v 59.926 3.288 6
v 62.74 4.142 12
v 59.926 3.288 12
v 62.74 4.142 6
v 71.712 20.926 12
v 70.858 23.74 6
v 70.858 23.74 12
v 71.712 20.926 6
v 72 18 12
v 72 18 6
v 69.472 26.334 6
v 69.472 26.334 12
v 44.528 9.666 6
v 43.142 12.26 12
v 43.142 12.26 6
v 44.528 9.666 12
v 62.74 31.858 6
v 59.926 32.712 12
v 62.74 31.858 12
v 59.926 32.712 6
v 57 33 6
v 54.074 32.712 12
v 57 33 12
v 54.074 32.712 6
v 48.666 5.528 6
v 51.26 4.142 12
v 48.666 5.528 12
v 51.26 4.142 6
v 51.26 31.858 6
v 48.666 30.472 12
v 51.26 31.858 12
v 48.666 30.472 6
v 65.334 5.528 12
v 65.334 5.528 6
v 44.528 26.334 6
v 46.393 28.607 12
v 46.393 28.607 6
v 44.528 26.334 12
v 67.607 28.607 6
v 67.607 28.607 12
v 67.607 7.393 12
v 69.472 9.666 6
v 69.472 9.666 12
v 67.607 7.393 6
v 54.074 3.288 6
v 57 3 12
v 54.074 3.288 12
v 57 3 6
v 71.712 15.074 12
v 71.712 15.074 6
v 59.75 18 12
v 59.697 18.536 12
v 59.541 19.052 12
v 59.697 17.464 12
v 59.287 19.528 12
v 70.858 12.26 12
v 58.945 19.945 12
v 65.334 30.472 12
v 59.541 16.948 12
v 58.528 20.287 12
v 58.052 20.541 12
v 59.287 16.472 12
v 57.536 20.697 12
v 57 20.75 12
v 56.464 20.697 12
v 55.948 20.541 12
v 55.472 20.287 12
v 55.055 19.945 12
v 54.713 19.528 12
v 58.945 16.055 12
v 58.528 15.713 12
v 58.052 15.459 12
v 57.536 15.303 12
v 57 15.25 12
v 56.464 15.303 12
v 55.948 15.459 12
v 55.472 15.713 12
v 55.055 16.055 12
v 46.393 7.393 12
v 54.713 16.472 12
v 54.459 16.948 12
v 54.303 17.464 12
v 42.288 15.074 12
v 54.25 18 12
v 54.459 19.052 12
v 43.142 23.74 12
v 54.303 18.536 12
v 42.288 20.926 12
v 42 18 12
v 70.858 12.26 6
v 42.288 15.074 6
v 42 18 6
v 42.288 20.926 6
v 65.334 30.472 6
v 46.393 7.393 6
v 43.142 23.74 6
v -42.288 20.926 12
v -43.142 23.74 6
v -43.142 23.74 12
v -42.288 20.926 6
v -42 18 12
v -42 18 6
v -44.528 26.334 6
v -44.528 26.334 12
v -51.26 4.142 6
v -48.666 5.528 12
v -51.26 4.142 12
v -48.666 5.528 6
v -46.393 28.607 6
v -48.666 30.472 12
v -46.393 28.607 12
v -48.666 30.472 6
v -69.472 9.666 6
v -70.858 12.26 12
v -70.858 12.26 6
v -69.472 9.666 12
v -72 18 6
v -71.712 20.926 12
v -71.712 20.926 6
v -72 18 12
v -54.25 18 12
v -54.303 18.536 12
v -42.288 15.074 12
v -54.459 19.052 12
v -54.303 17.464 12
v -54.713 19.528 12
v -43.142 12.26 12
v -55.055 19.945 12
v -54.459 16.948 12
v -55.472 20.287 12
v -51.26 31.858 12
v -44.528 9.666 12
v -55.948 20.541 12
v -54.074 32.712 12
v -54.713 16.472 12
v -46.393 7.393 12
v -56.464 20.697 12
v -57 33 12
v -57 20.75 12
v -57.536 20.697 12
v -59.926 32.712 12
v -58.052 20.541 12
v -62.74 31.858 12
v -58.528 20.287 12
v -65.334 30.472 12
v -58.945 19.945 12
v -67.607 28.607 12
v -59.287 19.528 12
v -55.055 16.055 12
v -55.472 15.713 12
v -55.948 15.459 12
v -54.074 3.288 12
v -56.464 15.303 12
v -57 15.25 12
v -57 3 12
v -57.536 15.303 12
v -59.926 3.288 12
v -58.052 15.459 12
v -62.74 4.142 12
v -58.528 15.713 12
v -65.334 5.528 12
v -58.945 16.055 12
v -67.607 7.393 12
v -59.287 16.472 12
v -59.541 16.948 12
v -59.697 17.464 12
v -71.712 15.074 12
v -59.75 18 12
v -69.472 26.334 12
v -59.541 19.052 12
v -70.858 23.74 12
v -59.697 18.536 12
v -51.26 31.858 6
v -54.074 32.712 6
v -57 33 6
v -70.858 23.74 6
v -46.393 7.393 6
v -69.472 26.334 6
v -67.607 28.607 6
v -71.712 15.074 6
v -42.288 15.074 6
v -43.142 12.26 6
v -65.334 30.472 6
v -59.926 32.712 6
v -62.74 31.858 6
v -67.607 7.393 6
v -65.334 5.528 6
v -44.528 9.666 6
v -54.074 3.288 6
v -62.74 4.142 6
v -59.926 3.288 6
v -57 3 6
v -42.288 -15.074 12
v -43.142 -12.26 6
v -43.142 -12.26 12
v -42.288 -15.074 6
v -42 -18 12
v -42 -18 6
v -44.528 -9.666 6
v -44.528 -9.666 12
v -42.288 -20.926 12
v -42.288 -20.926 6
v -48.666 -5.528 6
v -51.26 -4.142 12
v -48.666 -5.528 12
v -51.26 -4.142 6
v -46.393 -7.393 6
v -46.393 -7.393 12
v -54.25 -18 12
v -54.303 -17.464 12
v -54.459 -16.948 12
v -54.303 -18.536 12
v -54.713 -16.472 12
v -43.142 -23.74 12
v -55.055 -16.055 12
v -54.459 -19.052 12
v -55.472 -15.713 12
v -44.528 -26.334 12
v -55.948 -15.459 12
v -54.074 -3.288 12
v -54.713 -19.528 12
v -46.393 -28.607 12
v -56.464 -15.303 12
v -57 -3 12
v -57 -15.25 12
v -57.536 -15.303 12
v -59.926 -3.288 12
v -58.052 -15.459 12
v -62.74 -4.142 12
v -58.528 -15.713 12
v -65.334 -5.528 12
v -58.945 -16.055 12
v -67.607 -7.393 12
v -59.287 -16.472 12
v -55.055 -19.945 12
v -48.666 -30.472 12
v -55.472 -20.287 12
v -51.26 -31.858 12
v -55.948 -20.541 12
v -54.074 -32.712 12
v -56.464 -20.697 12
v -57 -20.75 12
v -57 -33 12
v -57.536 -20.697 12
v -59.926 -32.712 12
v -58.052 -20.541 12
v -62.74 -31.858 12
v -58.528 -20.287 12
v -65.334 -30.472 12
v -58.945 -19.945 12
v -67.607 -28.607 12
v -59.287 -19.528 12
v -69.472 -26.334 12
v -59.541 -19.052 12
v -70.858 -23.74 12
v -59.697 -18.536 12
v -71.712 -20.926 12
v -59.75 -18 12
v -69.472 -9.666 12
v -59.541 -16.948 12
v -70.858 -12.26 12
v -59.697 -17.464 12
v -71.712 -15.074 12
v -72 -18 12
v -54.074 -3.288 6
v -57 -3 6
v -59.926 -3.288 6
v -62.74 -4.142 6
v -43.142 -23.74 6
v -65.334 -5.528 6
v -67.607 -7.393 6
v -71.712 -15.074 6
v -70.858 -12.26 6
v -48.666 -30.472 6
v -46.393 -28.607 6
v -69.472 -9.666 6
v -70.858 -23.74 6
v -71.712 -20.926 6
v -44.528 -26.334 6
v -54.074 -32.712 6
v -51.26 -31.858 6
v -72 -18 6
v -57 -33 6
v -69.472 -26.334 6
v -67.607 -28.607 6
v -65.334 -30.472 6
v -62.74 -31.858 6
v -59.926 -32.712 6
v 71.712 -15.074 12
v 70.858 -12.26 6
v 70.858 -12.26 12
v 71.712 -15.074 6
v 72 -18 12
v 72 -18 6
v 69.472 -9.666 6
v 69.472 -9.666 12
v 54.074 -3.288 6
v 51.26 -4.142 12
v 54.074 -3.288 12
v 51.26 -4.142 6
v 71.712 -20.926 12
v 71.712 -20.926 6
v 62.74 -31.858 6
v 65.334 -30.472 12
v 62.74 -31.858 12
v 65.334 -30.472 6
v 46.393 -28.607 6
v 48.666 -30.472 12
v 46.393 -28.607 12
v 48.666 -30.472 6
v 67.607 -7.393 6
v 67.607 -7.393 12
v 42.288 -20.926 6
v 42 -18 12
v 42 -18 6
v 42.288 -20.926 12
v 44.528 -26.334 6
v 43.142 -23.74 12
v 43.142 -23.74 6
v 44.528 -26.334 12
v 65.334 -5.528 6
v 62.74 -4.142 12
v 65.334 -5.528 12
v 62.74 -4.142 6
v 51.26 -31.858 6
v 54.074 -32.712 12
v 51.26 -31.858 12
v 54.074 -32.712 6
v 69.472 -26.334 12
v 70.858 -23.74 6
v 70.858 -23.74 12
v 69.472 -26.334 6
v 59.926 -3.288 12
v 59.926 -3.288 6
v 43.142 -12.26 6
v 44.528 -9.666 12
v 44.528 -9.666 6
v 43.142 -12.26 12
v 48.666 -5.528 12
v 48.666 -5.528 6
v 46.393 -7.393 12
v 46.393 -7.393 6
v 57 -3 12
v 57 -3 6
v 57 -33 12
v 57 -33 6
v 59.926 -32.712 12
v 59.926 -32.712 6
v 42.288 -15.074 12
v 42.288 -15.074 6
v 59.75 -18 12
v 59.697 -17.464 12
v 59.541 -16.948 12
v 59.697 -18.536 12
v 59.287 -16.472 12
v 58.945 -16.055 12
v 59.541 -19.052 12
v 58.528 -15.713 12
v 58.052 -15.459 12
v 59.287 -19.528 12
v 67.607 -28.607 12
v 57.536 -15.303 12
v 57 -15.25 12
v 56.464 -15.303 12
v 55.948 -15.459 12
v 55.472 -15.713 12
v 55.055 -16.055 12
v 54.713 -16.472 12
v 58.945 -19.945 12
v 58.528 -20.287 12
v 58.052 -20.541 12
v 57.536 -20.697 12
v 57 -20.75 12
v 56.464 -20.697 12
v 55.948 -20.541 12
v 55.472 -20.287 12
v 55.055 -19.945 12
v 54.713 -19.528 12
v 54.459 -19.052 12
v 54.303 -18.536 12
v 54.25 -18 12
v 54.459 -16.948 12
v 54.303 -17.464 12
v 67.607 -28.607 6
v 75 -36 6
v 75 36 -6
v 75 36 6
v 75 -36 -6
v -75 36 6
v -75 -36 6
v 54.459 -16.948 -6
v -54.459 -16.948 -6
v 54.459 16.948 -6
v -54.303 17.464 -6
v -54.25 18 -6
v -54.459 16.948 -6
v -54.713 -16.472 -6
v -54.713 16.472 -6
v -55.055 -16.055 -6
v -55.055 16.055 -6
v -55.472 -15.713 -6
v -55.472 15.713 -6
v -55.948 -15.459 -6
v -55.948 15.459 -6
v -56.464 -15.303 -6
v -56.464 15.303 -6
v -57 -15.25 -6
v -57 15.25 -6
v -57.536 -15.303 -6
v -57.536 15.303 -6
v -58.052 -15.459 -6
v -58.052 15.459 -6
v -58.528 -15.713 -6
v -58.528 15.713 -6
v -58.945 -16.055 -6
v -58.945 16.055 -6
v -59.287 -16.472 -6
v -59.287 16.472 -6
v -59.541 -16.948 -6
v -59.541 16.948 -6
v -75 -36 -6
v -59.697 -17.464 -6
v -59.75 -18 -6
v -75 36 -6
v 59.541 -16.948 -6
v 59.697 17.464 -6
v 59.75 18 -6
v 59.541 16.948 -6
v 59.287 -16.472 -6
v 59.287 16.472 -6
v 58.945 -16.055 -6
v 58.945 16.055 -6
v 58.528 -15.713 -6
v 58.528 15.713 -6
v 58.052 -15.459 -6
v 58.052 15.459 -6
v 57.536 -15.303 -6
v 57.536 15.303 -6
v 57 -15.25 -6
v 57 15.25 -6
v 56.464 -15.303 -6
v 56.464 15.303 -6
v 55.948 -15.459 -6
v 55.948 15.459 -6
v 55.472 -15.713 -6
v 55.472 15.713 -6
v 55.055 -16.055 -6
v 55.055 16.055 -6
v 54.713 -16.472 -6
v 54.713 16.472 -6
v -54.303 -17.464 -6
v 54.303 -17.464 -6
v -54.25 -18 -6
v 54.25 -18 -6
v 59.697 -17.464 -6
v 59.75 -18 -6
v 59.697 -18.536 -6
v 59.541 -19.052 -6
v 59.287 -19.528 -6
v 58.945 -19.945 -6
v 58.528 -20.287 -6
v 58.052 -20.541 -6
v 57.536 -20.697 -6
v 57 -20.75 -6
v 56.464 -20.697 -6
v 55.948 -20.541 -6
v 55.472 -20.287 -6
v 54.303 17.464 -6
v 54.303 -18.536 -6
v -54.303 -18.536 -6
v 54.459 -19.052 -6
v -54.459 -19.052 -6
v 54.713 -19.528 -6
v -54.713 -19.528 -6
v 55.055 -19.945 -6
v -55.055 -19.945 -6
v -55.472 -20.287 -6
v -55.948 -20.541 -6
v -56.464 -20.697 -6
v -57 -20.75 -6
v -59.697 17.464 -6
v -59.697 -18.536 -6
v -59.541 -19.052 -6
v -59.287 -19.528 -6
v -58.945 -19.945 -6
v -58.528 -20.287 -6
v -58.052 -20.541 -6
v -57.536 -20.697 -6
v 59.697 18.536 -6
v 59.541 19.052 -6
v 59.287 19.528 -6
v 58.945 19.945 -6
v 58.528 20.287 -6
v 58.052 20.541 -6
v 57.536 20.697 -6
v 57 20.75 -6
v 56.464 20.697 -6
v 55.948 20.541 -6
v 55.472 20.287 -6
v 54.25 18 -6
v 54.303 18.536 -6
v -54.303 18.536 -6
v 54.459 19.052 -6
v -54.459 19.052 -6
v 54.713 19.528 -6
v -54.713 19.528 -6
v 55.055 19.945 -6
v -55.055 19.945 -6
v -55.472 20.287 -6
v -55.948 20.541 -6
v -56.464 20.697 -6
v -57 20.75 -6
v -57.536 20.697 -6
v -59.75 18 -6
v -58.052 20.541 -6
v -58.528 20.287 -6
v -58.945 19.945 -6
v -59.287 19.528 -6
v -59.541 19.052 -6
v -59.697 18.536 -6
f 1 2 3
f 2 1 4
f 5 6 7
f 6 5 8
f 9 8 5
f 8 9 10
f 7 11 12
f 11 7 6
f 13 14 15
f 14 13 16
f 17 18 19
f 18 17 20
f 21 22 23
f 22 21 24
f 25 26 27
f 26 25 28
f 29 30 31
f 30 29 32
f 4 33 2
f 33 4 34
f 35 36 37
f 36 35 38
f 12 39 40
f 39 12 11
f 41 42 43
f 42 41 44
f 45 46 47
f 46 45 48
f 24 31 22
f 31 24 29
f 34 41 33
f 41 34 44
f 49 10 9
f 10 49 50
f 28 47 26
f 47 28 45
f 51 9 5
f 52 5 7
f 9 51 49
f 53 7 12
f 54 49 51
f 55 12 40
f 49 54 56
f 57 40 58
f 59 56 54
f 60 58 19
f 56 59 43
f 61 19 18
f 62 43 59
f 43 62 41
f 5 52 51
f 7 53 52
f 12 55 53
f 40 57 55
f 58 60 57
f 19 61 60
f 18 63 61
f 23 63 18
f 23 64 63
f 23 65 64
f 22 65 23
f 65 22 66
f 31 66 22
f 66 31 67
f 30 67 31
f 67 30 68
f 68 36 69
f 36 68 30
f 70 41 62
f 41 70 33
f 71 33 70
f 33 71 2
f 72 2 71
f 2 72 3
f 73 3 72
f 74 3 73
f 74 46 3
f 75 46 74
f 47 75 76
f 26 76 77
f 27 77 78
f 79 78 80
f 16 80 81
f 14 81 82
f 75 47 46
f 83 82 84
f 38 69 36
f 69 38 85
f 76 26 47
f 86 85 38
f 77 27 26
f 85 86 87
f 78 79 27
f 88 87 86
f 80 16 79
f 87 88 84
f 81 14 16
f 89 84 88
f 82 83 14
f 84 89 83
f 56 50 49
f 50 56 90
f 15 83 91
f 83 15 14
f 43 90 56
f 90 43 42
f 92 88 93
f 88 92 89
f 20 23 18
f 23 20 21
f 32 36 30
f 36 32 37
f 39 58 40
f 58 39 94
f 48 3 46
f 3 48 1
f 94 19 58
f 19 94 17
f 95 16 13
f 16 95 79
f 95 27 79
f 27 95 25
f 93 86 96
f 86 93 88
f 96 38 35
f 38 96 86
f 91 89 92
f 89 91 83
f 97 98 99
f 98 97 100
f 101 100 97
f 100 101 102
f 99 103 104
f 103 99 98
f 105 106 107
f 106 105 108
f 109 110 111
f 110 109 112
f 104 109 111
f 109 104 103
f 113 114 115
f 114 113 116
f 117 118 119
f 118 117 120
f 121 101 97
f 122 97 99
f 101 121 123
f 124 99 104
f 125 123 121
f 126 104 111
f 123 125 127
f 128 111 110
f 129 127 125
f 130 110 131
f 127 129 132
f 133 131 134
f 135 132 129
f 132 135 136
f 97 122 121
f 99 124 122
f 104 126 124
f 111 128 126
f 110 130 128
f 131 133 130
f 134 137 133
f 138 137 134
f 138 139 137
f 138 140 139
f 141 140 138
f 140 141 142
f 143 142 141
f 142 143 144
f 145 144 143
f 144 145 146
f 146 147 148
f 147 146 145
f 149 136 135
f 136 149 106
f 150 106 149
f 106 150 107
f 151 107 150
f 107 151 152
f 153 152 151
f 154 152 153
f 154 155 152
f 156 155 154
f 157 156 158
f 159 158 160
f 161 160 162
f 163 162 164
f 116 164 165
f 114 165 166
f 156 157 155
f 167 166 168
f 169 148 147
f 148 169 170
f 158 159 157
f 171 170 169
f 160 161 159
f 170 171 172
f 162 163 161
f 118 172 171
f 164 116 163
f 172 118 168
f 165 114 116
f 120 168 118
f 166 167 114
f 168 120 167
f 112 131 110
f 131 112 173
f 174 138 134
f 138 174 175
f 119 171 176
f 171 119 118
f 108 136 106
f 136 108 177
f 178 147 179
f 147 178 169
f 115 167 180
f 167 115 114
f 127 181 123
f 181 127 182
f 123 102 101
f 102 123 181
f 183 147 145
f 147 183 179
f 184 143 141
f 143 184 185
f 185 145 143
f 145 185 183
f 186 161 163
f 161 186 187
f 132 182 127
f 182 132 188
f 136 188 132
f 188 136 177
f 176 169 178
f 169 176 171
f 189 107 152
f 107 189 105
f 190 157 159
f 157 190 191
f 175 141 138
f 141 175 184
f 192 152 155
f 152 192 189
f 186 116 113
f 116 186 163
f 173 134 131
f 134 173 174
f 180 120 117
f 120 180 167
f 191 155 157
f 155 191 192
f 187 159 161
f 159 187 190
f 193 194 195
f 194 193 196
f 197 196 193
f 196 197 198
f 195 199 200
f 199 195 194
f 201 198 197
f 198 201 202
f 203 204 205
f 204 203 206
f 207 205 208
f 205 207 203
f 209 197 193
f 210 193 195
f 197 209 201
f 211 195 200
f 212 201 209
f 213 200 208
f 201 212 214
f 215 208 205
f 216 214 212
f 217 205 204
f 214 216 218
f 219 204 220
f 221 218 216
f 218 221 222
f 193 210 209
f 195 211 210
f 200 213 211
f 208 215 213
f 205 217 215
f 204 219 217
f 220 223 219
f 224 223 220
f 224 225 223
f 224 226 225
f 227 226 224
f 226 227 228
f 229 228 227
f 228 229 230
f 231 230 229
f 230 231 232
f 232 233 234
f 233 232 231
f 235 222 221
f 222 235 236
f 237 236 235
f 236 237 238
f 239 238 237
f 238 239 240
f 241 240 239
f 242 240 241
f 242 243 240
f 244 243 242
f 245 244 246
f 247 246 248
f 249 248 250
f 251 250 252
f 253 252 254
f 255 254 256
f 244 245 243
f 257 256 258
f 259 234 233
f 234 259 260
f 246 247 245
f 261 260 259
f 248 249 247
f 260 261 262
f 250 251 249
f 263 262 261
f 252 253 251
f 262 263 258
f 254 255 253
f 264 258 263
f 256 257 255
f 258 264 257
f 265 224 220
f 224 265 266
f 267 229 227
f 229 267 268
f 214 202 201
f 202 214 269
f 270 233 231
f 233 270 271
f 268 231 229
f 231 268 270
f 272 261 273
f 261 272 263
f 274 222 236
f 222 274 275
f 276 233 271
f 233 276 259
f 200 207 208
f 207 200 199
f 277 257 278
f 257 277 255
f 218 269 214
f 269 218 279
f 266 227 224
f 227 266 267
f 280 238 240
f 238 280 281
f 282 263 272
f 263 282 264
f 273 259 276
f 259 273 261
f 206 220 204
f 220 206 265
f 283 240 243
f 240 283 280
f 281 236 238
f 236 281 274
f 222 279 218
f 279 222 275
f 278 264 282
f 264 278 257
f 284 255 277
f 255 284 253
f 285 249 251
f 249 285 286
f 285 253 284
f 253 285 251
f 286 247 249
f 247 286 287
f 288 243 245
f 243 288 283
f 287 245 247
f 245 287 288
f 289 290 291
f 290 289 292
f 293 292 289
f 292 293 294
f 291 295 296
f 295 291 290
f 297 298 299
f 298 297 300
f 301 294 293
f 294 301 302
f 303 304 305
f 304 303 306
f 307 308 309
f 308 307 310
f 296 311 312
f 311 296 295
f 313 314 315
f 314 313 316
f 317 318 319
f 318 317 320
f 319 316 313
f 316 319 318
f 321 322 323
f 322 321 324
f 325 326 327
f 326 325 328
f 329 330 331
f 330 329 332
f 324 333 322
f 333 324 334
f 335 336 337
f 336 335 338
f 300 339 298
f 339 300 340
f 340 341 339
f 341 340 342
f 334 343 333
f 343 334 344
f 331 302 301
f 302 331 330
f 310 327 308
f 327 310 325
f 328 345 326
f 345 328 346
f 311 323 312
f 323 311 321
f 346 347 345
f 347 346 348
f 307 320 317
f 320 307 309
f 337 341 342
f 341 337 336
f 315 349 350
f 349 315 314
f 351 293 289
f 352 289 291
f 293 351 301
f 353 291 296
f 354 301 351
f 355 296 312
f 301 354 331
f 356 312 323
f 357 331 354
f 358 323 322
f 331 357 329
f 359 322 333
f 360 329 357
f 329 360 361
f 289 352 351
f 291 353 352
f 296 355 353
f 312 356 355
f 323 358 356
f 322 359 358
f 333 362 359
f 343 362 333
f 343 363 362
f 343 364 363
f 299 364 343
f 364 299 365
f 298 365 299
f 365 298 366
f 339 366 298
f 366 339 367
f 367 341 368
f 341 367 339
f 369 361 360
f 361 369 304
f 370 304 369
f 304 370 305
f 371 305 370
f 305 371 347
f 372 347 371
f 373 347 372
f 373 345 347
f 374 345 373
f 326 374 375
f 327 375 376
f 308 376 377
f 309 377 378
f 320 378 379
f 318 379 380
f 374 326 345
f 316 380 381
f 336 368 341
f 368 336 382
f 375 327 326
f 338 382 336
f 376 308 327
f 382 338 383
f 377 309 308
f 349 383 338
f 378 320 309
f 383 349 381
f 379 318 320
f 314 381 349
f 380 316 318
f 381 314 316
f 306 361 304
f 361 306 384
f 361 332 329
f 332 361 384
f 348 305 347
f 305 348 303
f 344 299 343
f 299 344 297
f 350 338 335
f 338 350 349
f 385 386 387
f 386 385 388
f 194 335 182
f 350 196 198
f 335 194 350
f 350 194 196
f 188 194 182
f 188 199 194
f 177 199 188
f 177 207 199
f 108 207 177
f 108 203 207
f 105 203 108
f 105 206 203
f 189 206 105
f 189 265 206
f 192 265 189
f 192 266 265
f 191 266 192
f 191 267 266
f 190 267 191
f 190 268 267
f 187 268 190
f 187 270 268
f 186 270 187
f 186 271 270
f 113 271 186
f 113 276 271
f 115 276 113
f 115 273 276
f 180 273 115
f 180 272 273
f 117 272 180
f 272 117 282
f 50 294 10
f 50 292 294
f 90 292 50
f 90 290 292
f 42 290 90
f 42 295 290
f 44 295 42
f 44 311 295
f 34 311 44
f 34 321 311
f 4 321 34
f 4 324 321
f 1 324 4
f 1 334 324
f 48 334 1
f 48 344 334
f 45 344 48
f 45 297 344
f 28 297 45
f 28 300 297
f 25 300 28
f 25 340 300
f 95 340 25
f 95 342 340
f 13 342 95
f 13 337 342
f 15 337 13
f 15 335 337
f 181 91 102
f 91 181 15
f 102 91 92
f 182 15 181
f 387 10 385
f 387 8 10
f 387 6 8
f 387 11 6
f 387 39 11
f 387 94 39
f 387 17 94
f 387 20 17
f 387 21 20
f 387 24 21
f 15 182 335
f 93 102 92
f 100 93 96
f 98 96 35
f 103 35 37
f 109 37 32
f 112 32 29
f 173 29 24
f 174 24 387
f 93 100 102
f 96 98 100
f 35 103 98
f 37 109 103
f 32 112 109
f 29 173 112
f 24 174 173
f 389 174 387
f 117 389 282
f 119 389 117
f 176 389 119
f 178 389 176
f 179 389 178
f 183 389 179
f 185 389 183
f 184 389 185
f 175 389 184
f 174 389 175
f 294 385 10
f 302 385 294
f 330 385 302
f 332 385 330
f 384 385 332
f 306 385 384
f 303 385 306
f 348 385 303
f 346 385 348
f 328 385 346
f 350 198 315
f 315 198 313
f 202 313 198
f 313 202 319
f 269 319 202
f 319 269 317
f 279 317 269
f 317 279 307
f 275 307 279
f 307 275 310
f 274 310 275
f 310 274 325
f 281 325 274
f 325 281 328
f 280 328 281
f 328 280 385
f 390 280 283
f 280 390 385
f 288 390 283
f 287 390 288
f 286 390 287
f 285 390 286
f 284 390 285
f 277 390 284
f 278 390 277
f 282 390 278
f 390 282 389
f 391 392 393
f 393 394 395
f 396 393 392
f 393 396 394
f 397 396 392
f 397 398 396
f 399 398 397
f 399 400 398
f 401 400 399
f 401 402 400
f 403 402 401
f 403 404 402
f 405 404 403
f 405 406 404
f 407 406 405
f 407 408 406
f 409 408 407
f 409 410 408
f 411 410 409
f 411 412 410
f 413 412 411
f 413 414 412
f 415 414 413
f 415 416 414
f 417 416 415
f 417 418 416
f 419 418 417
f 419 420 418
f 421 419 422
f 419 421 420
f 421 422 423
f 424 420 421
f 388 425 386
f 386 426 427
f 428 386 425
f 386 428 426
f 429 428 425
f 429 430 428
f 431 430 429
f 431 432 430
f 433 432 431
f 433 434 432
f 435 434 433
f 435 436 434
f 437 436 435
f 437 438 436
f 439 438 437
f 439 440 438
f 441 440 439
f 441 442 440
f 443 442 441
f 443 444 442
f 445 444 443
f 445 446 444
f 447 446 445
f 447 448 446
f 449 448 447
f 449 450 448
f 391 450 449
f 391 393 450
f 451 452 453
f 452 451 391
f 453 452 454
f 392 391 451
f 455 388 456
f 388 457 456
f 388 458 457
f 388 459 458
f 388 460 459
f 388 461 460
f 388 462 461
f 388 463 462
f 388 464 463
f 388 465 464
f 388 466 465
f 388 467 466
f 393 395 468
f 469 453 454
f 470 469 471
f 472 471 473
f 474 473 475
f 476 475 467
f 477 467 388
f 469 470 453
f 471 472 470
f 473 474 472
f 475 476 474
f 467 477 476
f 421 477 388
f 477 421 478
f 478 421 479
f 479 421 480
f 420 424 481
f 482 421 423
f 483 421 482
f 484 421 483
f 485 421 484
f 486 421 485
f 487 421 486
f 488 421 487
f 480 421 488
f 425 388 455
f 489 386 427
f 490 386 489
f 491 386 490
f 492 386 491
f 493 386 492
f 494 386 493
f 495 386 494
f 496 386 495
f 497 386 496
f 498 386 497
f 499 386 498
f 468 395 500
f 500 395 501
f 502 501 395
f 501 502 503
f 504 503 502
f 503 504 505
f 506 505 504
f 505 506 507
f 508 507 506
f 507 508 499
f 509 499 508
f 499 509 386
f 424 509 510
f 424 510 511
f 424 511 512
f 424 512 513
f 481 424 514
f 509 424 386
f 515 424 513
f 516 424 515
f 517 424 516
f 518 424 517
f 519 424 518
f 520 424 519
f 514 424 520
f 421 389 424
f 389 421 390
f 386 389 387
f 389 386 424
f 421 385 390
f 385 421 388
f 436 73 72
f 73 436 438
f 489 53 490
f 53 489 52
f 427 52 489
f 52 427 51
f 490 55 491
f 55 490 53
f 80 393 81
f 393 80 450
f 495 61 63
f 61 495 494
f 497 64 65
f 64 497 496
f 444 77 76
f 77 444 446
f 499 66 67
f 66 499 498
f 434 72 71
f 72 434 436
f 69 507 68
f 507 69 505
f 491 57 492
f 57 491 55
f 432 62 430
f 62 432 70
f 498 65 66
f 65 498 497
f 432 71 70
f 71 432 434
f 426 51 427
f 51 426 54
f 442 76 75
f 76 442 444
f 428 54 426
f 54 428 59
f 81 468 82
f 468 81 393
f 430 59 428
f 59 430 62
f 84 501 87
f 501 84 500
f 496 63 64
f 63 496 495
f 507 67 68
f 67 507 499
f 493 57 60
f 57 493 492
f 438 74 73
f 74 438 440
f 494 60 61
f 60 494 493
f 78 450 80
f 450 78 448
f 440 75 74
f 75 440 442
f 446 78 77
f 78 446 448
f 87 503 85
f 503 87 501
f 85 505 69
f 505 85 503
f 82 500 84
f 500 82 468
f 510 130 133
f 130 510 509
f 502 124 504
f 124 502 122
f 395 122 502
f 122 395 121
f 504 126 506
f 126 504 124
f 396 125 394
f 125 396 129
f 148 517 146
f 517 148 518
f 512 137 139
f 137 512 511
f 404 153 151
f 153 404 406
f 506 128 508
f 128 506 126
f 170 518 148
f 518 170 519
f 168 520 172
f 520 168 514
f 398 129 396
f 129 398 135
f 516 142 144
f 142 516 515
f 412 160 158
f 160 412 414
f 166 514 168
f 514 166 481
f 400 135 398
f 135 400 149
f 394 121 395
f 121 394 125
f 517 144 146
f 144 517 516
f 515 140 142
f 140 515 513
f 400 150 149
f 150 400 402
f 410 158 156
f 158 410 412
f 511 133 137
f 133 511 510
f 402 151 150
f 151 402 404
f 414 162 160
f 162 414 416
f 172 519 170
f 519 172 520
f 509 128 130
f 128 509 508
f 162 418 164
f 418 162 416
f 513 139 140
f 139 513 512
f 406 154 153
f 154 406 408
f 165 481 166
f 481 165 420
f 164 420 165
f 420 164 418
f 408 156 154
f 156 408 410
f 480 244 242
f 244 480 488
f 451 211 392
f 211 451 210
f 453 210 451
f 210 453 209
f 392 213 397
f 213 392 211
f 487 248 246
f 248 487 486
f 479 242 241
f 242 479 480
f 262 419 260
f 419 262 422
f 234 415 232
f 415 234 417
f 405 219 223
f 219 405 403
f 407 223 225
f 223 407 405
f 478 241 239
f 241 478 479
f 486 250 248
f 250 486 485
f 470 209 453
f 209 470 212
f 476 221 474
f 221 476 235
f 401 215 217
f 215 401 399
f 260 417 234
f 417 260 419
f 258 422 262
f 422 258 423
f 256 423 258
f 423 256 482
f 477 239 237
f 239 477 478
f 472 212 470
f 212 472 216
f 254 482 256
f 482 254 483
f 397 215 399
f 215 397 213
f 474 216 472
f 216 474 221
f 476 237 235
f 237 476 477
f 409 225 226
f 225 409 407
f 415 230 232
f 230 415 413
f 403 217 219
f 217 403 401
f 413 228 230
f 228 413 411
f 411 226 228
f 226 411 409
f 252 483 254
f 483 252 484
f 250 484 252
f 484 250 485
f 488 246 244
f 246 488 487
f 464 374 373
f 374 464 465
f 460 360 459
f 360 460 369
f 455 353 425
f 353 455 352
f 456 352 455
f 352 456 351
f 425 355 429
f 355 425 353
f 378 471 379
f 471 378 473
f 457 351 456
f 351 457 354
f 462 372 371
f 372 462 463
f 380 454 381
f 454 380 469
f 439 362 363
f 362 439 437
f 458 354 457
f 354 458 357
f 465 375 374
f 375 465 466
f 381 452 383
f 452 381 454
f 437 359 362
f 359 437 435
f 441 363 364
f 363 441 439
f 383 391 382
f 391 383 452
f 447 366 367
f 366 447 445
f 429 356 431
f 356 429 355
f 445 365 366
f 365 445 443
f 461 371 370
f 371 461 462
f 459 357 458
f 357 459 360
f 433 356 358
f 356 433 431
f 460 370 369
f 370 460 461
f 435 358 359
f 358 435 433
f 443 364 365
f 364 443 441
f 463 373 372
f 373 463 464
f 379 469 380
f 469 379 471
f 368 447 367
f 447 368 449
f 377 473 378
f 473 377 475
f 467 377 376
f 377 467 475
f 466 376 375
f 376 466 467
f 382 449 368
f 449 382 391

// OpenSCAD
$fn = 32;

// ----------------------------------------------------------------------
// Anchor pads 150 x 72 x 18
// four corner bosses with anchor holes
// ----------------------------------------------------------------------

// --- parameters (mm) ---
plate = [150, 72, 12];  // base plate size (x, y, z)
pads = 4;               // boss count, one per corner
edge = 18;              // boss centre offset from the plate edge
boss_d = 30;            // boss diameter
boss_h = 6;             // boss height above the base plate
hole_d = 5.5;           // hole diameter

// --- derived feature positions (mm) ---
height = plate[2] + boss_h;      // = 18   overall height of the part
corner_x = plate[0] / 2 - edge;  // = 57   boss centre X
corner_y = plate[1] / 2 - edge;  // = 18   boss centre Y
feature_centers = [
  [corner_x, corner_y],
  [-corner_x, corner_y],
  [-corner_x, -corner_y],
  [corner_x, -corner_y]
];   // boss centres, anchor holes are drilled there

// base plate, four bosses standing on it, anchor holes all the way through
difference() {
  union() {
    cube(plate, center = true);
    for (centre = feature_centers)
      translate([centre[0], centre[1], plate[2] / 2 - 1])
        cylinder(d = boss_d, h = boss_h + 1);
  }
  for (centre = feature_centers)
    translate([centre[0], centre[1], -height])
      cylinder(d = hole_d, h = 2 * height + 2);  // through boss and plate
}
